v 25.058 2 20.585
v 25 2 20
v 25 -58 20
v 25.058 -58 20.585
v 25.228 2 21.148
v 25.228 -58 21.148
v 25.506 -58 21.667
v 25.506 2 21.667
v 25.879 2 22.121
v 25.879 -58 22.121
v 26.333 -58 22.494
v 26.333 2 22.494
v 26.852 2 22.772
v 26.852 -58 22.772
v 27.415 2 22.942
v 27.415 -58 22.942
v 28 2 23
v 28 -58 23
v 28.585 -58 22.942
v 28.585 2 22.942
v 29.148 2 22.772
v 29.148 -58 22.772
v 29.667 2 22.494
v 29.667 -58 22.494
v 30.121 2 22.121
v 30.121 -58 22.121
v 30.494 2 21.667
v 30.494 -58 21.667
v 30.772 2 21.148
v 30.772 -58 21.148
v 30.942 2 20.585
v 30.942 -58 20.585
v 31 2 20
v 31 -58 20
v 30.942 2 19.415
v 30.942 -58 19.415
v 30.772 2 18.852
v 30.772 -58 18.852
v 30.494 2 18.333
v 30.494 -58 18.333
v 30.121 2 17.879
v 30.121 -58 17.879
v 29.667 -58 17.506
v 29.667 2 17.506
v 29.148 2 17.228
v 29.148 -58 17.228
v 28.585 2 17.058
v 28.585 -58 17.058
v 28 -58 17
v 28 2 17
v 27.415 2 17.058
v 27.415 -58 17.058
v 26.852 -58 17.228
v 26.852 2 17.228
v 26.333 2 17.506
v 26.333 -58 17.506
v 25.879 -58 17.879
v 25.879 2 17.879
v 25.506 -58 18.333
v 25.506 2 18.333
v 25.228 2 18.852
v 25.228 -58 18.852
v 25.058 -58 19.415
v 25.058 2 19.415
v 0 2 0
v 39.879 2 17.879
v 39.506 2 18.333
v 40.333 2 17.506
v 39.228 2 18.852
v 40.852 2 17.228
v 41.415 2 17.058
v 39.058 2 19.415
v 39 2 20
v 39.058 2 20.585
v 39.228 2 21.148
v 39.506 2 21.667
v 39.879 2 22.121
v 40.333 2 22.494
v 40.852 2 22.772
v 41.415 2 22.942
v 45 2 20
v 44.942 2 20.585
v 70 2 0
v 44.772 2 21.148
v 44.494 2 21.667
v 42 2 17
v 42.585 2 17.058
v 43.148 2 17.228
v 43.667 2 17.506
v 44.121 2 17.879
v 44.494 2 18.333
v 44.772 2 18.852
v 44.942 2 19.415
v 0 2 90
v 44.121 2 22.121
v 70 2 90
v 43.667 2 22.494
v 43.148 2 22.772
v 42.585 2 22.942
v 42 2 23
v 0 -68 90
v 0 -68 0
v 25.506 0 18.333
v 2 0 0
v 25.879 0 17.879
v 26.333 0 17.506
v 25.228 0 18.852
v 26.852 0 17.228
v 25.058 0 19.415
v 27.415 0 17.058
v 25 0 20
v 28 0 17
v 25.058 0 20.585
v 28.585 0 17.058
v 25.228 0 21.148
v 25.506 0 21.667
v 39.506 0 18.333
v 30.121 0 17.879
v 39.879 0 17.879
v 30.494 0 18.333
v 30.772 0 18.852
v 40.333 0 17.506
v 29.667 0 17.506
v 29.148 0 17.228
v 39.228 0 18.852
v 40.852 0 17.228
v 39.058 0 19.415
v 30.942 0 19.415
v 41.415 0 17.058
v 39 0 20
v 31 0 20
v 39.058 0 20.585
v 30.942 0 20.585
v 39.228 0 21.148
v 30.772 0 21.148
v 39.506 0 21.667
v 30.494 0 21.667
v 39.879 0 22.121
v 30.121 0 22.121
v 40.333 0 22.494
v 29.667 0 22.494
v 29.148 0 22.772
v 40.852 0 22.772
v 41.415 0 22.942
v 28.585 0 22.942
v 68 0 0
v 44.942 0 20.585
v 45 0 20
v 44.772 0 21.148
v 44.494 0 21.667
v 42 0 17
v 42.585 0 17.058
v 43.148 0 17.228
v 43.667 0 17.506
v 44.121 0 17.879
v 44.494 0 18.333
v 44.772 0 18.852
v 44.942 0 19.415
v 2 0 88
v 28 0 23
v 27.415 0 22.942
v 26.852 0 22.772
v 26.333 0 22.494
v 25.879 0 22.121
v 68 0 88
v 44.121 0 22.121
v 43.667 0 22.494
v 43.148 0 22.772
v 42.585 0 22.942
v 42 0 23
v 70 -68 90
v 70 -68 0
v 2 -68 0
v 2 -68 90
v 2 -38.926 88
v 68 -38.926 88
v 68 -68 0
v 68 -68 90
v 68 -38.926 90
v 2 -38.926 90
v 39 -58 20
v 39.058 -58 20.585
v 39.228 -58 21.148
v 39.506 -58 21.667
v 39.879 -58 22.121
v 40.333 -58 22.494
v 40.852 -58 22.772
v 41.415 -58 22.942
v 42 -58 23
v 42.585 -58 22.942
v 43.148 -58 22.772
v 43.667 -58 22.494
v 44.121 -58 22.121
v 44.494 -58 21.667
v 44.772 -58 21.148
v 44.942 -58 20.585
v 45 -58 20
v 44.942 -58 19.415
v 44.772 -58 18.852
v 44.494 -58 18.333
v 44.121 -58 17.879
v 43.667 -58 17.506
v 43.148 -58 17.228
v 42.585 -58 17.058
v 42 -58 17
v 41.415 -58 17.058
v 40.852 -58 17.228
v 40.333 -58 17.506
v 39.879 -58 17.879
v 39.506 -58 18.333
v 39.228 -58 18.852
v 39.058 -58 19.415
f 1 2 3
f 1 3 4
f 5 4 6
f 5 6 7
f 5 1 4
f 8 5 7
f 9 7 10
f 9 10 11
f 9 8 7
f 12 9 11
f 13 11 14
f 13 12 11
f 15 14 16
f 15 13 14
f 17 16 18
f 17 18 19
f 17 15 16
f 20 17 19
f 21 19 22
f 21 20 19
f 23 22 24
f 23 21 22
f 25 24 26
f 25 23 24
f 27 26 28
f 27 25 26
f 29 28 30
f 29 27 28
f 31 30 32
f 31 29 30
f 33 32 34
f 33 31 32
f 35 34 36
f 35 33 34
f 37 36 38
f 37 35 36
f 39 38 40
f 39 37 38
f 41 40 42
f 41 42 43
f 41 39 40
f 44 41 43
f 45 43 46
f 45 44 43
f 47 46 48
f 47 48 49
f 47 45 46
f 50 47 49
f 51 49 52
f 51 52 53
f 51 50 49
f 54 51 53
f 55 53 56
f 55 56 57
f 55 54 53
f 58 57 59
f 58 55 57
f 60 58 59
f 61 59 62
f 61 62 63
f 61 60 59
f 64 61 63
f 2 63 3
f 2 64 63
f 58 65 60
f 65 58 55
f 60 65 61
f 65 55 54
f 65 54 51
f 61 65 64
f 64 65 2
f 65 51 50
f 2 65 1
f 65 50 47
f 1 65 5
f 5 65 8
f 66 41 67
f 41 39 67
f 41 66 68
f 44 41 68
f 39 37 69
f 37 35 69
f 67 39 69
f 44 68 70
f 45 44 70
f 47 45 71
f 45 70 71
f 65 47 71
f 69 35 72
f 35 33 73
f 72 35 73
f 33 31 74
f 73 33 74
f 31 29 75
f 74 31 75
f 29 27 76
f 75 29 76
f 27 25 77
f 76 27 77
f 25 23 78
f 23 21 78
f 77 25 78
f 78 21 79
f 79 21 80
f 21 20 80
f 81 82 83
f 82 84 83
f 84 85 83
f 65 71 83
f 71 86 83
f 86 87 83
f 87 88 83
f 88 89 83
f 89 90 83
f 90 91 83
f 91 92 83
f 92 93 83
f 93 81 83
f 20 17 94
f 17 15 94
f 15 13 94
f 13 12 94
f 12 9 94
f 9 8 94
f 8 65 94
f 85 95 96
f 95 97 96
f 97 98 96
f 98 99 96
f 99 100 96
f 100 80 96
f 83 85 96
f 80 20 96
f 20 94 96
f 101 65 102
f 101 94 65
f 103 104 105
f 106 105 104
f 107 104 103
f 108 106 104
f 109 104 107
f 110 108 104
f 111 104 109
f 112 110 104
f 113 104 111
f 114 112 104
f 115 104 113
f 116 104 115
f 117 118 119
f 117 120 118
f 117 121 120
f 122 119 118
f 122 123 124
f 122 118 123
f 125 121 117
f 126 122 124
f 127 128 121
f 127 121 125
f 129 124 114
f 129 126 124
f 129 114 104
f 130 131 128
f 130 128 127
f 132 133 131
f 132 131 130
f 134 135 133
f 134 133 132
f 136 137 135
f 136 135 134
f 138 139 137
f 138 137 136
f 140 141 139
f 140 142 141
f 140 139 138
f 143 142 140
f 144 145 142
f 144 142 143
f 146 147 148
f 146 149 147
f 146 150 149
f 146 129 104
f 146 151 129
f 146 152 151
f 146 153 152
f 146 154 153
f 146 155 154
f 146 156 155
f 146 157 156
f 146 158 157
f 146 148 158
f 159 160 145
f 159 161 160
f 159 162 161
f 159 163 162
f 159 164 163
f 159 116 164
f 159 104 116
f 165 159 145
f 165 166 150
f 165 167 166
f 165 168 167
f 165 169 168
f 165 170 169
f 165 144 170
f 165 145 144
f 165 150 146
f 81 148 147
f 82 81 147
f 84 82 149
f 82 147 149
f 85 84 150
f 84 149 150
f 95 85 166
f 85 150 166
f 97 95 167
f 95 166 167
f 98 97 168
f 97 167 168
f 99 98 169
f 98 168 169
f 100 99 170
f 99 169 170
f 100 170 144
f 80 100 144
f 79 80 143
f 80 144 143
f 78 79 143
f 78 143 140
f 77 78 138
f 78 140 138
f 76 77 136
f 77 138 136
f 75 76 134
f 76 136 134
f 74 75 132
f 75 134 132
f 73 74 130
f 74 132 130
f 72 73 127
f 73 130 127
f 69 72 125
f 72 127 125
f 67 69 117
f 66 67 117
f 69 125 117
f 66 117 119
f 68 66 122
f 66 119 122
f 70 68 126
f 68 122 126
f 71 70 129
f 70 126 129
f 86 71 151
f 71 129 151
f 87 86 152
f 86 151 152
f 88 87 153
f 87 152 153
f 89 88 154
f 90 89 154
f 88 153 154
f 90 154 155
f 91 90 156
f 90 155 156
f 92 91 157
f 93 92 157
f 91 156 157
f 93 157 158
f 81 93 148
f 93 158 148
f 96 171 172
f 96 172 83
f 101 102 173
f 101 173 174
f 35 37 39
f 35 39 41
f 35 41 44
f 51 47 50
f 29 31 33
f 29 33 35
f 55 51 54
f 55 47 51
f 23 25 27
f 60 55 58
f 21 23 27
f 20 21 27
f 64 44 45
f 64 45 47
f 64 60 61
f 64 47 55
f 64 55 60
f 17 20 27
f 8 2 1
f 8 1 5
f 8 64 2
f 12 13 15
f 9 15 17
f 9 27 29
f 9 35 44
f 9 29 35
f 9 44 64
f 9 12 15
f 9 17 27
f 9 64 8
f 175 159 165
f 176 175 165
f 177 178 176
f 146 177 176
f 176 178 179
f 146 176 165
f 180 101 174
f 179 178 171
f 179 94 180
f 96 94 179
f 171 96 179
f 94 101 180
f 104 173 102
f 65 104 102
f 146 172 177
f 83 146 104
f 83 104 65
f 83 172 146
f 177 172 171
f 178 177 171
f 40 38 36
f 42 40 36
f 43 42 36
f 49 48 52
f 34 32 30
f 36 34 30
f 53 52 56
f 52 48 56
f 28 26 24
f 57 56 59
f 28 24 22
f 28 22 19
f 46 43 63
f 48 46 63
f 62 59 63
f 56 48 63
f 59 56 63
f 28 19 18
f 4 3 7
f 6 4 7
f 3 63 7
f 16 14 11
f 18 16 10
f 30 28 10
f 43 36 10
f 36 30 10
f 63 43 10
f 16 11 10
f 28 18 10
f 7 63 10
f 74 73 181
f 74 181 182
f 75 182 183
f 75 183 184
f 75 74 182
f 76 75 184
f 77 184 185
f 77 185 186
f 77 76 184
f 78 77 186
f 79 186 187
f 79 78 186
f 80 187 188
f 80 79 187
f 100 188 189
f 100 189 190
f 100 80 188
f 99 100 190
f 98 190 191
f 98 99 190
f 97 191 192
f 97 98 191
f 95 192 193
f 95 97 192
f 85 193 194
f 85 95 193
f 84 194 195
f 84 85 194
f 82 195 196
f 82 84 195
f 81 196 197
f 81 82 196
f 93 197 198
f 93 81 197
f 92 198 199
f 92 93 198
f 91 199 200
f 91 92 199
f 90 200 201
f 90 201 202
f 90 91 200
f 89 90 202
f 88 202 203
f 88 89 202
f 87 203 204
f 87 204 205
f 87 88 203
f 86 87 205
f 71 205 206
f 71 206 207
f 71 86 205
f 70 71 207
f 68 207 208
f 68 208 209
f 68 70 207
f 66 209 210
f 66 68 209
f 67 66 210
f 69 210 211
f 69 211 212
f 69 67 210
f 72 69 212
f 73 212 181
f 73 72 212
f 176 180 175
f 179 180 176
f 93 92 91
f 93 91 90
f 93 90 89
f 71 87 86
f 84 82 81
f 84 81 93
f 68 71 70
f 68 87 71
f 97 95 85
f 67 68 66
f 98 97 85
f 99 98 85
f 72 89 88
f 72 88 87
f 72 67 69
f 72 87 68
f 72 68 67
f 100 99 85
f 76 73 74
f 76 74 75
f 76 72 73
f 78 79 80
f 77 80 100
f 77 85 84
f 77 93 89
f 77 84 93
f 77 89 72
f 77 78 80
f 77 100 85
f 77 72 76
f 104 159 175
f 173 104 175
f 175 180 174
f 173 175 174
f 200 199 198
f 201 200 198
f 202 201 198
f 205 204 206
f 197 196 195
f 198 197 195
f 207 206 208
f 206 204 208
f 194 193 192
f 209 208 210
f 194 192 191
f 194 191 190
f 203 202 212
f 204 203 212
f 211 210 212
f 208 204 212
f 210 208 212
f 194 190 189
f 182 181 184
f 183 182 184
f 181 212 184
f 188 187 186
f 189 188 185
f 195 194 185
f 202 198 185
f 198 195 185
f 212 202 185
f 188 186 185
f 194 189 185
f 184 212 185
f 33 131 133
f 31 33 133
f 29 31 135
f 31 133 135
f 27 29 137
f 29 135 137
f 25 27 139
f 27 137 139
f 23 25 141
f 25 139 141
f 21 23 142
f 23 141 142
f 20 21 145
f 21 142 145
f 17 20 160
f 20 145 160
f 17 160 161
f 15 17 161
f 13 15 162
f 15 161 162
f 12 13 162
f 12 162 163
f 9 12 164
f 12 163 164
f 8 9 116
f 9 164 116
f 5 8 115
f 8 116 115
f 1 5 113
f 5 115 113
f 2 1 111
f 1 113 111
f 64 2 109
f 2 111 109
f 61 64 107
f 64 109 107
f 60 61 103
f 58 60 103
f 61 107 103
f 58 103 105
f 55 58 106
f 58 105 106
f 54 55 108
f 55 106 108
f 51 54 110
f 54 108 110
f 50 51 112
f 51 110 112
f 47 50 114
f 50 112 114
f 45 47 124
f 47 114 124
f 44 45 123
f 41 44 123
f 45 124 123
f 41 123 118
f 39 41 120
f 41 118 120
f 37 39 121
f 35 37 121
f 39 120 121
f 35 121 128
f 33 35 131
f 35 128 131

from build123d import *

# Parameters (mm, degrees)
F0_W     = 70
F0_H     = 90
F0_R     = 3
F1_DEPTH = 2
F2_W     = 68
F2_H     = 90
F3_DEPTH = 2
F4_W     = 68
F4_H     = 90
F5_DEPTH = 2
F6_W     = 66
F6_H     = 38.9259047806
F7_DEPTH = 2
F8_R     = 3
F9_DEPTH = 60


with BuildPart() as f1:
    # F0 (on Front) → F1 (new body)
    with BuildSketch(Plane.XZ):
        with Locations((35, 45)):
            Rectangle(F0_W, F0_H)
        with Locations((28, 20)):
            Circle(F0_R, mode=Mode.SUBTRACT)
        with Locations((42, 20)):
            Circle(F0_R, mode=Mode.SUBTRACT)
    extrude(amount=-F1_DEPTH)

    # F2 (on face) → F3 (join)
    with BuildSketch(Plane(origin=(0, 0, 0), x_dir=(0, -1, 0), z_dir=(-1, 0, 0))):
        with Locations((34, 45)):
            Rectangle(F2_W, F2_H)
    extrude(amount=-F3_DEPTH)

    # F4 (on face) → F5 (join)
    with BuildSketch(Plane.YZ.offset(70)):
        with Locations((-34, 45)):
            Rectangle(F4_W, F4_H)
    extrude(amount=-F5_DEPTH)

    # F6 (on face) → F7 (join)
    with BuildSketch(Plane.XY.offset(90)):
        with Locations((35, -19.4629523903)):
            Rectangle(F6_W, F6_H)
    extrude(amount=-F7_DEPTH)


with BuildPart() as f9:
    # F8 (on face) → F9 (new body)
    with BuildSketch(Plane(origin=(0, 2, 0), x_dir=(-1, 0, 0), z_dir=(0, 1, 0))):
        with Locations((-42, 20)):
            Circle(F8_R)
    extrude(amount=-F9_DEPTH)


with BuildPart() as f9b:
    # F8 (on face) → F9, piece 2 (new body)
    with BuildSketch(Plane(origin=(0, 2, 0), x_dir=(-1, 0, 0), z_dir=(0, 1, 0))):
        with Locations((-28, 20)):
            Circle(F8_R)
    extrude(amount=-F9_DEPTH)


solid = Compound([f1.part, f9.part, f9b.part])
